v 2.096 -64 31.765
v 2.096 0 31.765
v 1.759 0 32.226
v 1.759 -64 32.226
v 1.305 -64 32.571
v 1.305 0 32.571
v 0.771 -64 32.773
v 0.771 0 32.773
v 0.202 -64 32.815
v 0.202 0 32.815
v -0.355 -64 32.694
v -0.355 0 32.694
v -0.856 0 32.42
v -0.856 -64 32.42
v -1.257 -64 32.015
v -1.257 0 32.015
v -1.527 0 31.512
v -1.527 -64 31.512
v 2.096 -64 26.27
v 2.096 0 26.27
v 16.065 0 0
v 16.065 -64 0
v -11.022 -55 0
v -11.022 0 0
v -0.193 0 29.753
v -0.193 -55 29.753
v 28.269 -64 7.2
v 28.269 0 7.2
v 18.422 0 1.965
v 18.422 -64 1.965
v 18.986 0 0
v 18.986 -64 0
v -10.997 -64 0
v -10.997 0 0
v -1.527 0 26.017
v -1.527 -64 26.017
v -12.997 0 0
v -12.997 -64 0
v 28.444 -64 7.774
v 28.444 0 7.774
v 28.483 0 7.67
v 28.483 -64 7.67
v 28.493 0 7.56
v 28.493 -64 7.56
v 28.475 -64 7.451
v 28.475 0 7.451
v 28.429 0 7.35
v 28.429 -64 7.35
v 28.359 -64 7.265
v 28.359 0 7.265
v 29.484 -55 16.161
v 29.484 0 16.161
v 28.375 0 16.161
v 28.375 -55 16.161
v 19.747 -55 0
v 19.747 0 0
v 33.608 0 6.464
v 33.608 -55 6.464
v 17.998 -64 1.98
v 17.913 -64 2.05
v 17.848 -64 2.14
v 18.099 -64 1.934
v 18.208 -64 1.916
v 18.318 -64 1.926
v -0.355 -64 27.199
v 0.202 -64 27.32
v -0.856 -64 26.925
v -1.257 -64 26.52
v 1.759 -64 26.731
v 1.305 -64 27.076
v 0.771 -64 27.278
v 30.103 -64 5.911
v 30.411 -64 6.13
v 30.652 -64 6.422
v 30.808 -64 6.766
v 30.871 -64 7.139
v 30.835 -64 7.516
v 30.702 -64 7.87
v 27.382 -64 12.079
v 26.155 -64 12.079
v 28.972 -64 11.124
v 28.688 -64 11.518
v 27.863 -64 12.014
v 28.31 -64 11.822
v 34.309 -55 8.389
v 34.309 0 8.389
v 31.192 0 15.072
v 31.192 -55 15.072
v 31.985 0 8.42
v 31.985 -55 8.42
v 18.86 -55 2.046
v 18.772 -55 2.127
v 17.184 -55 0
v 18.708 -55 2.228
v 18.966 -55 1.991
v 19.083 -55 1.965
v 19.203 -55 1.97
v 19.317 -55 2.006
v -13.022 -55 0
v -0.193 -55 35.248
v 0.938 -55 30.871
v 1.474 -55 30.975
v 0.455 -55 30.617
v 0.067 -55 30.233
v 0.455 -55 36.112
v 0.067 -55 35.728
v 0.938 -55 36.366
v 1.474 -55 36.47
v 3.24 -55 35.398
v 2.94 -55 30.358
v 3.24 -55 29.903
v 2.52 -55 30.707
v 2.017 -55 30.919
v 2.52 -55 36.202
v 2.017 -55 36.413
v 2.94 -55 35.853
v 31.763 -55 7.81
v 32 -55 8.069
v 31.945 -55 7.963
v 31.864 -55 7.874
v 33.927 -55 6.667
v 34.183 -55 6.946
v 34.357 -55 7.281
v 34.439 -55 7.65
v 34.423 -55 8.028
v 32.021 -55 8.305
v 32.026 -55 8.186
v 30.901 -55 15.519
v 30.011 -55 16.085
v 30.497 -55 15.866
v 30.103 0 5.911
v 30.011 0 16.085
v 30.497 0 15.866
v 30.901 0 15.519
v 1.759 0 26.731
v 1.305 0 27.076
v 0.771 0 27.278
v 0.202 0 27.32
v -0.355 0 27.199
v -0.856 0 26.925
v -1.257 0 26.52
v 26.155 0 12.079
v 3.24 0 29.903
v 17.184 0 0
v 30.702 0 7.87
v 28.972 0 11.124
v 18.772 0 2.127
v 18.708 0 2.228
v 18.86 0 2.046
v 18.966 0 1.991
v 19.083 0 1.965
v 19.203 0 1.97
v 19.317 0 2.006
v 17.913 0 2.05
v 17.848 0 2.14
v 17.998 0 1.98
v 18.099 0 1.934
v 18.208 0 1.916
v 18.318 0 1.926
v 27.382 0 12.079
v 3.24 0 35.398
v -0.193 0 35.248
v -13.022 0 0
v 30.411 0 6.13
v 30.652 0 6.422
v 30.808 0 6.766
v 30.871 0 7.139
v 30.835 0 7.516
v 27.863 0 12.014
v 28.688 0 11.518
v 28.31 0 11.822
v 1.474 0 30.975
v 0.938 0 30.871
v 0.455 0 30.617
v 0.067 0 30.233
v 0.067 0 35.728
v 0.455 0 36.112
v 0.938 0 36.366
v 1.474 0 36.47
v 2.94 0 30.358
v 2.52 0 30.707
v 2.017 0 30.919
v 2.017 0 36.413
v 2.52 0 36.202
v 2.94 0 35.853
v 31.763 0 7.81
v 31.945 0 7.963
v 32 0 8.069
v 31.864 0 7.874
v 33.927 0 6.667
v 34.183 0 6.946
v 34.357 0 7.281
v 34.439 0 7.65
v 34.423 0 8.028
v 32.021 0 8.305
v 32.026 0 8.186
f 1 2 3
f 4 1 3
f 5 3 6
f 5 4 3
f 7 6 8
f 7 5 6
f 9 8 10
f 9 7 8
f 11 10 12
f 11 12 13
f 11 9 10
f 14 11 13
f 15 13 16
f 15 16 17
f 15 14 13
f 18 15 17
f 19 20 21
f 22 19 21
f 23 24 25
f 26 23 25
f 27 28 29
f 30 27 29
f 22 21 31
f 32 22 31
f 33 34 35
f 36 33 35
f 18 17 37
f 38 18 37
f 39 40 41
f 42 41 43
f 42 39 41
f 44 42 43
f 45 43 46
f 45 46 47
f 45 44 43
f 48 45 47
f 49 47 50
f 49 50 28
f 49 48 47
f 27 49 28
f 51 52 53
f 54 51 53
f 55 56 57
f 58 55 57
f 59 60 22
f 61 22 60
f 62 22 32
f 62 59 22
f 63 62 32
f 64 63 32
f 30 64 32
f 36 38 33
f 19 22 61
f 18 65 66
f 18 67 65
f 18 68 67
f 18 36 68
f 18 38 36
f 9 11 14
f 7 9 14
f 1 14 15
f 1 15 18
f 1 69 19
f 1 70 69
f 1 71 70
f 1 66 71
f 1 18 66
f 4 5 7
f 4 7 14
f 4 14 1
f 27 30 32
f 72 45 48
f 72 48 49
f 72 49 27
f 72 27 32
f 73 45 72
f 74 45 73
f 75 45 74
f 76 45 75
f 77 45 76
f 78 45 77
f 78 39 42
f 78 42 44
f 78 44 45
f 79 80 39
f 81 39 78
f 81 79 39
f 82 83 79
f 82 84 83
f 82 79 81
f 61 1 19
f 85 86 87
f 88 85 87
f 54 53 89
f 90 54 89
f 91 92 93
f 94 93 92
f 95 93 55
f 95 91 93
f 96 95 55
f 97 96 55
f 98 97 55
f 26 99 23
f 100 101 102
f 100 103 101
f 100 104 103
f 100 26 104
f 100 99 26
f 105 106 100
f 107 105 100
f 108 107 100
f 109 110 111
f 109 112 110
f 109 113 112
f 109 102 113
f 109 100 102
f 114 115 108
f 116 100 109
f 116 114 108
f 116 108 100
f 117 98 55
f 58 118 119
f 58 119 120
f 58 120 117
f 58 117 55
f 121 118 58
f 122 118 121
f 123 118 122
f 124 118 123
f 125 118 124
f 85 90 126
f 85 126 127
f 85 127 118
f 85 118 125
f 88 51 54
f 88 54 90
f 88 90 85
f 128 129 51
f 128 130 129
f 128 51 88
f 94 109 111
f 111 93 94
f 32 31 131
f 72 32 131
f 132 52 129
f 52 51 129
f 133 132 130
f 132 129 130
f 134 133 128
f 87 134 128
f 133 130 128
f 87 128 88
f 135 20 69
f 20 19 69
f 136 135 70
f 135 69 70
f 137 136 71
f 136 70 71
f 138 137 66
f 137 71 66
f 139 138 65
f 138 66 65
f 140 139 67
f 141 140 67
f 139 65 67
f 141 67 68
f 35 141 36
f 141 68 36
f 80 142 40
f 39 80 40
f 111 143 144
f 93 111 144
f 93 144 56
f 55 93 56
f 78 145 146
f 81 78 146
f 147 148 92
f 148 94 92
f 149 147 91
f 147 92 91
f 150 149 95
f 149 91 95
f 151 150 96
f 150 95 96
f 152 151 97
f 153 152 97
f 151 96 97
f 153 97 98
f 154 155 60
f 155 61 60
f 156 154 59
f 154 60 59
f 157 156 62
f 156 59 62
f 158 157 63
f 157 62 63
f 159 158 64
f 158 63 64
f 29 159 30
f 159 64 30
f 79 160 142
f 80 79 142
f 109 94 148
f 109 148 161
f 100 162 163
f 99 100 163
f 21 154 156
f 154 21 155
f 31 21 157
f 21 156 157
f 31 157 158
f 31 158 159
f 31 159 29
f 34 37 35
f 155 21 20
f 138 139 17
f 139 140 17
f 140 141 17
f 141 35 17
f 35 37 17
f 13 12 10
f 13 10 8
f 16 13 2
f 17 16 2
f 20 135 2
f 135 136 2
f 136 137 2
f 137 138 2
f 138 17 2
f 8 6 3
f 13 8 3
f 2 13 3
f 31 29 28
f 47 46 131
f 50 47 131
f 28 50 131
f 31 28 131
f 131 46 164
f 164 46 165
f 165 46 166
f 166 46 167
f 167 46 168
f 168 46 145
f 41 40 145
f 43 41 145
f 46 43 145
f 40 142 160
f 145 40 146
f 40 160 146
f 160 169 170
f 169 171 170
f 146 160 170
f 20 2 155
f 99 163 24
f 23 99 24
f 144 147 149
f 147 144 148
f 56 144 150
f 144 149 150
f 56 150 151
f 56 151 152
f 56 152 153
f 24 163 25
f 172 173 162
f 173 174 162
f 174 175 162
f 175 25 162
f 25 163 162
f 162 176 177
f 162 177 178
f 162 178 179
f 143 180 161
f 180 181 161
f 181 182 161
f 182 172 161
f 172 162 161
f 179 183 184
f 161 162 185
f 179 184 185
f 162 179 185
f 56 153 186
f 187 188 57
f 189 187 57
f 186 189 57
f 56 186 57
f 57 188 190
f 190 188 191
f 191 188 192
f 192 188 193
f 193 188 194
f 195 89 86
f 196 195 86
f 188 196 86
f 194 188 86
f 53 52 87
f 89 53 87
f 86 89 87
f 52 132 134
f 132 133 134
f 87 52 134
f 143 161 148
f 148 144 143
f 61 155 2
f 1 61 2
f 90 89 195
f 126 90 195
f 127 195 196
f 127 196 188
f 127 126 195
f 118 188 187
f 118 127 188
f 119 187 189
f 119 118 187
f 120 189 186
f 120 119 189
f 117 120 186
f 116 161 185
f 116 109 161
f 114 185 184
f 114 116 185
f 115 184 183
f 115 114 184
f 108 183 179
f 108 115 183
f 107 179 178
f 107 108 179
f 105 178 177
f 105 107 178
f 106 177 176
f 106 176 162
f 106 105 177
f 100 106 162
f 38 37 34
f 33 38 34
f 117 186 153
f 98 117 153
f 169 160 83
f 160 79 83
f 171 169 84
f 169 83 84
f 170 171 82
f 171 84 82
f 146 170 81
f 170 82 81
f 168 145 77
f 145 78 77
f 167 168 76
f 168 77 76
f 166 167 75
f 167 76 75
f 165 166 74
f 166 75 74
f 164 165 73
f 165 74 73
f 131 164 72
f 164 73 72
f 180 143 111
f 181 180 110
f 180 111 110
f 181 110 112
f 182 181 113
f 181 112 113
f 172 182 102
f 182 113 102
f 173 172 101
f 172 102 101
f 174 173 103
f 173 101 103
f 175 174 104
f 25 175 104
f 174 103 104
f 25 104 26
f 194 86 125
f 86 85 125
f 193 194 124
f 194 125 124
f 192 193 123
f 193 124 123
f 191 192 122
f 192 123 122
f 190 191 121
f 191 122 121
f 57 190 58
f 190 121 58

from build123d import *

# Parameters (mm, degrees)
F1_DEPTH = 64
F2_R     = 1.988217
F3_R     = 0.424
F4_R     = 1.800359
F5_R     = 1.448528
F7_DEPTH = 55
F8_R     = 1.859743
F9_R     = 0.458701
F10_R    = 1.884872
F11_R    = 1.448528


with BuildPart() as f1:
    # F0 (on Front) → F1 (new body)
    with BuildSketch(Plane.XZ):
        Polygon((0, 30.213365), (16.064731, 0), (18.98645, 0), (31.382222, 6.590949), (28.46408, 12.079176), (26.154679, 12.079176), (28.642878, 7.399554), (18.047507, 1.765895), (0, 35.70832), (-12.996765, 0), (-10.996765, 0), align=None)
    extrude(amount=F1_DEPTH)

    # F2
    f2_edges = [f1.edges().sort_by_distance(p)[0] for p in [
        (0, -32, 30.213365),
        (0, -32, 35.70832),
    ]]
    fillet(f2_edges, radius=F2_R)

    # F3
    f3_edges = [f1.edges().sort_by_distance(p)[0] for p in [
        (18.047507, -32, 1.765895),
        (28.642878, -32, 7.399554),
    ]]
    fillet(f3_edges, radius=F3_R)

    # F4
    f4_edges = [f1.edges().sort_by_distance(p)[0] for p in [
        (28.46408, -32, 12.079176),
    ]]
    fillet(f4_edges, radius=F4_R)

    # F5
    f5_edges = [f1.edges().sort_by_distance(p)[0] for p in [
        (31.382222, -32, 6.590949),
    ]]
    fillet(f5_edges, radius=F5_R)


with BuildPart() as f7:
    # F6 (on Front) → F7 (new body)
    with BuildSketch(Plane.XZ):
        Polygon((1.342843, 33.972135), (17.18431, 0), (19.74665, 0), (34.920986, 7.075909), (30.684659, 16.160743), (28.375258, 16.160743), (32.178822, 8.003973), (18.901413, 1.812616), (1.342843, 39.46709), (-13.022003, 0), (-11.022003, 0), align=None)
    extrude(amount=F7_DEPTH)

    # F8
    f8_edges = [f7.edges().sort_by_distance(p)[0] for p in [
        (1.342843, -27.5, 39.46709),
        (1.342843, -27.5, 33.972135),
    ]]
    fillet(f8_edges, radius=F8_R)

    # F9
    f9_edges = [f7.edges().sort_by_distance(p)[0] for p in [
        (18.901413, -27.5, 1.812616),
        (32.178822, -27.5, 8.003973),
    ]]
    fillet(f9_edges, radius=F9_R)

    # F10
    f10_edges = [f7.edges().sort_by_distance(p)[0] for p in [
        (30.684659, -27.5, 16.160743),
    ]]
    fillet(f10_edges, radius=F10_R)

    # F11
    f11_edges = [f7.edges().sort_by_distance(p)[0] for p in [
        (34.920986, -27.5, 7.075909),
    ]]
    fillet(f11_edges, radius=F11_R)


solid = Compound([f1.part, f7.part])
